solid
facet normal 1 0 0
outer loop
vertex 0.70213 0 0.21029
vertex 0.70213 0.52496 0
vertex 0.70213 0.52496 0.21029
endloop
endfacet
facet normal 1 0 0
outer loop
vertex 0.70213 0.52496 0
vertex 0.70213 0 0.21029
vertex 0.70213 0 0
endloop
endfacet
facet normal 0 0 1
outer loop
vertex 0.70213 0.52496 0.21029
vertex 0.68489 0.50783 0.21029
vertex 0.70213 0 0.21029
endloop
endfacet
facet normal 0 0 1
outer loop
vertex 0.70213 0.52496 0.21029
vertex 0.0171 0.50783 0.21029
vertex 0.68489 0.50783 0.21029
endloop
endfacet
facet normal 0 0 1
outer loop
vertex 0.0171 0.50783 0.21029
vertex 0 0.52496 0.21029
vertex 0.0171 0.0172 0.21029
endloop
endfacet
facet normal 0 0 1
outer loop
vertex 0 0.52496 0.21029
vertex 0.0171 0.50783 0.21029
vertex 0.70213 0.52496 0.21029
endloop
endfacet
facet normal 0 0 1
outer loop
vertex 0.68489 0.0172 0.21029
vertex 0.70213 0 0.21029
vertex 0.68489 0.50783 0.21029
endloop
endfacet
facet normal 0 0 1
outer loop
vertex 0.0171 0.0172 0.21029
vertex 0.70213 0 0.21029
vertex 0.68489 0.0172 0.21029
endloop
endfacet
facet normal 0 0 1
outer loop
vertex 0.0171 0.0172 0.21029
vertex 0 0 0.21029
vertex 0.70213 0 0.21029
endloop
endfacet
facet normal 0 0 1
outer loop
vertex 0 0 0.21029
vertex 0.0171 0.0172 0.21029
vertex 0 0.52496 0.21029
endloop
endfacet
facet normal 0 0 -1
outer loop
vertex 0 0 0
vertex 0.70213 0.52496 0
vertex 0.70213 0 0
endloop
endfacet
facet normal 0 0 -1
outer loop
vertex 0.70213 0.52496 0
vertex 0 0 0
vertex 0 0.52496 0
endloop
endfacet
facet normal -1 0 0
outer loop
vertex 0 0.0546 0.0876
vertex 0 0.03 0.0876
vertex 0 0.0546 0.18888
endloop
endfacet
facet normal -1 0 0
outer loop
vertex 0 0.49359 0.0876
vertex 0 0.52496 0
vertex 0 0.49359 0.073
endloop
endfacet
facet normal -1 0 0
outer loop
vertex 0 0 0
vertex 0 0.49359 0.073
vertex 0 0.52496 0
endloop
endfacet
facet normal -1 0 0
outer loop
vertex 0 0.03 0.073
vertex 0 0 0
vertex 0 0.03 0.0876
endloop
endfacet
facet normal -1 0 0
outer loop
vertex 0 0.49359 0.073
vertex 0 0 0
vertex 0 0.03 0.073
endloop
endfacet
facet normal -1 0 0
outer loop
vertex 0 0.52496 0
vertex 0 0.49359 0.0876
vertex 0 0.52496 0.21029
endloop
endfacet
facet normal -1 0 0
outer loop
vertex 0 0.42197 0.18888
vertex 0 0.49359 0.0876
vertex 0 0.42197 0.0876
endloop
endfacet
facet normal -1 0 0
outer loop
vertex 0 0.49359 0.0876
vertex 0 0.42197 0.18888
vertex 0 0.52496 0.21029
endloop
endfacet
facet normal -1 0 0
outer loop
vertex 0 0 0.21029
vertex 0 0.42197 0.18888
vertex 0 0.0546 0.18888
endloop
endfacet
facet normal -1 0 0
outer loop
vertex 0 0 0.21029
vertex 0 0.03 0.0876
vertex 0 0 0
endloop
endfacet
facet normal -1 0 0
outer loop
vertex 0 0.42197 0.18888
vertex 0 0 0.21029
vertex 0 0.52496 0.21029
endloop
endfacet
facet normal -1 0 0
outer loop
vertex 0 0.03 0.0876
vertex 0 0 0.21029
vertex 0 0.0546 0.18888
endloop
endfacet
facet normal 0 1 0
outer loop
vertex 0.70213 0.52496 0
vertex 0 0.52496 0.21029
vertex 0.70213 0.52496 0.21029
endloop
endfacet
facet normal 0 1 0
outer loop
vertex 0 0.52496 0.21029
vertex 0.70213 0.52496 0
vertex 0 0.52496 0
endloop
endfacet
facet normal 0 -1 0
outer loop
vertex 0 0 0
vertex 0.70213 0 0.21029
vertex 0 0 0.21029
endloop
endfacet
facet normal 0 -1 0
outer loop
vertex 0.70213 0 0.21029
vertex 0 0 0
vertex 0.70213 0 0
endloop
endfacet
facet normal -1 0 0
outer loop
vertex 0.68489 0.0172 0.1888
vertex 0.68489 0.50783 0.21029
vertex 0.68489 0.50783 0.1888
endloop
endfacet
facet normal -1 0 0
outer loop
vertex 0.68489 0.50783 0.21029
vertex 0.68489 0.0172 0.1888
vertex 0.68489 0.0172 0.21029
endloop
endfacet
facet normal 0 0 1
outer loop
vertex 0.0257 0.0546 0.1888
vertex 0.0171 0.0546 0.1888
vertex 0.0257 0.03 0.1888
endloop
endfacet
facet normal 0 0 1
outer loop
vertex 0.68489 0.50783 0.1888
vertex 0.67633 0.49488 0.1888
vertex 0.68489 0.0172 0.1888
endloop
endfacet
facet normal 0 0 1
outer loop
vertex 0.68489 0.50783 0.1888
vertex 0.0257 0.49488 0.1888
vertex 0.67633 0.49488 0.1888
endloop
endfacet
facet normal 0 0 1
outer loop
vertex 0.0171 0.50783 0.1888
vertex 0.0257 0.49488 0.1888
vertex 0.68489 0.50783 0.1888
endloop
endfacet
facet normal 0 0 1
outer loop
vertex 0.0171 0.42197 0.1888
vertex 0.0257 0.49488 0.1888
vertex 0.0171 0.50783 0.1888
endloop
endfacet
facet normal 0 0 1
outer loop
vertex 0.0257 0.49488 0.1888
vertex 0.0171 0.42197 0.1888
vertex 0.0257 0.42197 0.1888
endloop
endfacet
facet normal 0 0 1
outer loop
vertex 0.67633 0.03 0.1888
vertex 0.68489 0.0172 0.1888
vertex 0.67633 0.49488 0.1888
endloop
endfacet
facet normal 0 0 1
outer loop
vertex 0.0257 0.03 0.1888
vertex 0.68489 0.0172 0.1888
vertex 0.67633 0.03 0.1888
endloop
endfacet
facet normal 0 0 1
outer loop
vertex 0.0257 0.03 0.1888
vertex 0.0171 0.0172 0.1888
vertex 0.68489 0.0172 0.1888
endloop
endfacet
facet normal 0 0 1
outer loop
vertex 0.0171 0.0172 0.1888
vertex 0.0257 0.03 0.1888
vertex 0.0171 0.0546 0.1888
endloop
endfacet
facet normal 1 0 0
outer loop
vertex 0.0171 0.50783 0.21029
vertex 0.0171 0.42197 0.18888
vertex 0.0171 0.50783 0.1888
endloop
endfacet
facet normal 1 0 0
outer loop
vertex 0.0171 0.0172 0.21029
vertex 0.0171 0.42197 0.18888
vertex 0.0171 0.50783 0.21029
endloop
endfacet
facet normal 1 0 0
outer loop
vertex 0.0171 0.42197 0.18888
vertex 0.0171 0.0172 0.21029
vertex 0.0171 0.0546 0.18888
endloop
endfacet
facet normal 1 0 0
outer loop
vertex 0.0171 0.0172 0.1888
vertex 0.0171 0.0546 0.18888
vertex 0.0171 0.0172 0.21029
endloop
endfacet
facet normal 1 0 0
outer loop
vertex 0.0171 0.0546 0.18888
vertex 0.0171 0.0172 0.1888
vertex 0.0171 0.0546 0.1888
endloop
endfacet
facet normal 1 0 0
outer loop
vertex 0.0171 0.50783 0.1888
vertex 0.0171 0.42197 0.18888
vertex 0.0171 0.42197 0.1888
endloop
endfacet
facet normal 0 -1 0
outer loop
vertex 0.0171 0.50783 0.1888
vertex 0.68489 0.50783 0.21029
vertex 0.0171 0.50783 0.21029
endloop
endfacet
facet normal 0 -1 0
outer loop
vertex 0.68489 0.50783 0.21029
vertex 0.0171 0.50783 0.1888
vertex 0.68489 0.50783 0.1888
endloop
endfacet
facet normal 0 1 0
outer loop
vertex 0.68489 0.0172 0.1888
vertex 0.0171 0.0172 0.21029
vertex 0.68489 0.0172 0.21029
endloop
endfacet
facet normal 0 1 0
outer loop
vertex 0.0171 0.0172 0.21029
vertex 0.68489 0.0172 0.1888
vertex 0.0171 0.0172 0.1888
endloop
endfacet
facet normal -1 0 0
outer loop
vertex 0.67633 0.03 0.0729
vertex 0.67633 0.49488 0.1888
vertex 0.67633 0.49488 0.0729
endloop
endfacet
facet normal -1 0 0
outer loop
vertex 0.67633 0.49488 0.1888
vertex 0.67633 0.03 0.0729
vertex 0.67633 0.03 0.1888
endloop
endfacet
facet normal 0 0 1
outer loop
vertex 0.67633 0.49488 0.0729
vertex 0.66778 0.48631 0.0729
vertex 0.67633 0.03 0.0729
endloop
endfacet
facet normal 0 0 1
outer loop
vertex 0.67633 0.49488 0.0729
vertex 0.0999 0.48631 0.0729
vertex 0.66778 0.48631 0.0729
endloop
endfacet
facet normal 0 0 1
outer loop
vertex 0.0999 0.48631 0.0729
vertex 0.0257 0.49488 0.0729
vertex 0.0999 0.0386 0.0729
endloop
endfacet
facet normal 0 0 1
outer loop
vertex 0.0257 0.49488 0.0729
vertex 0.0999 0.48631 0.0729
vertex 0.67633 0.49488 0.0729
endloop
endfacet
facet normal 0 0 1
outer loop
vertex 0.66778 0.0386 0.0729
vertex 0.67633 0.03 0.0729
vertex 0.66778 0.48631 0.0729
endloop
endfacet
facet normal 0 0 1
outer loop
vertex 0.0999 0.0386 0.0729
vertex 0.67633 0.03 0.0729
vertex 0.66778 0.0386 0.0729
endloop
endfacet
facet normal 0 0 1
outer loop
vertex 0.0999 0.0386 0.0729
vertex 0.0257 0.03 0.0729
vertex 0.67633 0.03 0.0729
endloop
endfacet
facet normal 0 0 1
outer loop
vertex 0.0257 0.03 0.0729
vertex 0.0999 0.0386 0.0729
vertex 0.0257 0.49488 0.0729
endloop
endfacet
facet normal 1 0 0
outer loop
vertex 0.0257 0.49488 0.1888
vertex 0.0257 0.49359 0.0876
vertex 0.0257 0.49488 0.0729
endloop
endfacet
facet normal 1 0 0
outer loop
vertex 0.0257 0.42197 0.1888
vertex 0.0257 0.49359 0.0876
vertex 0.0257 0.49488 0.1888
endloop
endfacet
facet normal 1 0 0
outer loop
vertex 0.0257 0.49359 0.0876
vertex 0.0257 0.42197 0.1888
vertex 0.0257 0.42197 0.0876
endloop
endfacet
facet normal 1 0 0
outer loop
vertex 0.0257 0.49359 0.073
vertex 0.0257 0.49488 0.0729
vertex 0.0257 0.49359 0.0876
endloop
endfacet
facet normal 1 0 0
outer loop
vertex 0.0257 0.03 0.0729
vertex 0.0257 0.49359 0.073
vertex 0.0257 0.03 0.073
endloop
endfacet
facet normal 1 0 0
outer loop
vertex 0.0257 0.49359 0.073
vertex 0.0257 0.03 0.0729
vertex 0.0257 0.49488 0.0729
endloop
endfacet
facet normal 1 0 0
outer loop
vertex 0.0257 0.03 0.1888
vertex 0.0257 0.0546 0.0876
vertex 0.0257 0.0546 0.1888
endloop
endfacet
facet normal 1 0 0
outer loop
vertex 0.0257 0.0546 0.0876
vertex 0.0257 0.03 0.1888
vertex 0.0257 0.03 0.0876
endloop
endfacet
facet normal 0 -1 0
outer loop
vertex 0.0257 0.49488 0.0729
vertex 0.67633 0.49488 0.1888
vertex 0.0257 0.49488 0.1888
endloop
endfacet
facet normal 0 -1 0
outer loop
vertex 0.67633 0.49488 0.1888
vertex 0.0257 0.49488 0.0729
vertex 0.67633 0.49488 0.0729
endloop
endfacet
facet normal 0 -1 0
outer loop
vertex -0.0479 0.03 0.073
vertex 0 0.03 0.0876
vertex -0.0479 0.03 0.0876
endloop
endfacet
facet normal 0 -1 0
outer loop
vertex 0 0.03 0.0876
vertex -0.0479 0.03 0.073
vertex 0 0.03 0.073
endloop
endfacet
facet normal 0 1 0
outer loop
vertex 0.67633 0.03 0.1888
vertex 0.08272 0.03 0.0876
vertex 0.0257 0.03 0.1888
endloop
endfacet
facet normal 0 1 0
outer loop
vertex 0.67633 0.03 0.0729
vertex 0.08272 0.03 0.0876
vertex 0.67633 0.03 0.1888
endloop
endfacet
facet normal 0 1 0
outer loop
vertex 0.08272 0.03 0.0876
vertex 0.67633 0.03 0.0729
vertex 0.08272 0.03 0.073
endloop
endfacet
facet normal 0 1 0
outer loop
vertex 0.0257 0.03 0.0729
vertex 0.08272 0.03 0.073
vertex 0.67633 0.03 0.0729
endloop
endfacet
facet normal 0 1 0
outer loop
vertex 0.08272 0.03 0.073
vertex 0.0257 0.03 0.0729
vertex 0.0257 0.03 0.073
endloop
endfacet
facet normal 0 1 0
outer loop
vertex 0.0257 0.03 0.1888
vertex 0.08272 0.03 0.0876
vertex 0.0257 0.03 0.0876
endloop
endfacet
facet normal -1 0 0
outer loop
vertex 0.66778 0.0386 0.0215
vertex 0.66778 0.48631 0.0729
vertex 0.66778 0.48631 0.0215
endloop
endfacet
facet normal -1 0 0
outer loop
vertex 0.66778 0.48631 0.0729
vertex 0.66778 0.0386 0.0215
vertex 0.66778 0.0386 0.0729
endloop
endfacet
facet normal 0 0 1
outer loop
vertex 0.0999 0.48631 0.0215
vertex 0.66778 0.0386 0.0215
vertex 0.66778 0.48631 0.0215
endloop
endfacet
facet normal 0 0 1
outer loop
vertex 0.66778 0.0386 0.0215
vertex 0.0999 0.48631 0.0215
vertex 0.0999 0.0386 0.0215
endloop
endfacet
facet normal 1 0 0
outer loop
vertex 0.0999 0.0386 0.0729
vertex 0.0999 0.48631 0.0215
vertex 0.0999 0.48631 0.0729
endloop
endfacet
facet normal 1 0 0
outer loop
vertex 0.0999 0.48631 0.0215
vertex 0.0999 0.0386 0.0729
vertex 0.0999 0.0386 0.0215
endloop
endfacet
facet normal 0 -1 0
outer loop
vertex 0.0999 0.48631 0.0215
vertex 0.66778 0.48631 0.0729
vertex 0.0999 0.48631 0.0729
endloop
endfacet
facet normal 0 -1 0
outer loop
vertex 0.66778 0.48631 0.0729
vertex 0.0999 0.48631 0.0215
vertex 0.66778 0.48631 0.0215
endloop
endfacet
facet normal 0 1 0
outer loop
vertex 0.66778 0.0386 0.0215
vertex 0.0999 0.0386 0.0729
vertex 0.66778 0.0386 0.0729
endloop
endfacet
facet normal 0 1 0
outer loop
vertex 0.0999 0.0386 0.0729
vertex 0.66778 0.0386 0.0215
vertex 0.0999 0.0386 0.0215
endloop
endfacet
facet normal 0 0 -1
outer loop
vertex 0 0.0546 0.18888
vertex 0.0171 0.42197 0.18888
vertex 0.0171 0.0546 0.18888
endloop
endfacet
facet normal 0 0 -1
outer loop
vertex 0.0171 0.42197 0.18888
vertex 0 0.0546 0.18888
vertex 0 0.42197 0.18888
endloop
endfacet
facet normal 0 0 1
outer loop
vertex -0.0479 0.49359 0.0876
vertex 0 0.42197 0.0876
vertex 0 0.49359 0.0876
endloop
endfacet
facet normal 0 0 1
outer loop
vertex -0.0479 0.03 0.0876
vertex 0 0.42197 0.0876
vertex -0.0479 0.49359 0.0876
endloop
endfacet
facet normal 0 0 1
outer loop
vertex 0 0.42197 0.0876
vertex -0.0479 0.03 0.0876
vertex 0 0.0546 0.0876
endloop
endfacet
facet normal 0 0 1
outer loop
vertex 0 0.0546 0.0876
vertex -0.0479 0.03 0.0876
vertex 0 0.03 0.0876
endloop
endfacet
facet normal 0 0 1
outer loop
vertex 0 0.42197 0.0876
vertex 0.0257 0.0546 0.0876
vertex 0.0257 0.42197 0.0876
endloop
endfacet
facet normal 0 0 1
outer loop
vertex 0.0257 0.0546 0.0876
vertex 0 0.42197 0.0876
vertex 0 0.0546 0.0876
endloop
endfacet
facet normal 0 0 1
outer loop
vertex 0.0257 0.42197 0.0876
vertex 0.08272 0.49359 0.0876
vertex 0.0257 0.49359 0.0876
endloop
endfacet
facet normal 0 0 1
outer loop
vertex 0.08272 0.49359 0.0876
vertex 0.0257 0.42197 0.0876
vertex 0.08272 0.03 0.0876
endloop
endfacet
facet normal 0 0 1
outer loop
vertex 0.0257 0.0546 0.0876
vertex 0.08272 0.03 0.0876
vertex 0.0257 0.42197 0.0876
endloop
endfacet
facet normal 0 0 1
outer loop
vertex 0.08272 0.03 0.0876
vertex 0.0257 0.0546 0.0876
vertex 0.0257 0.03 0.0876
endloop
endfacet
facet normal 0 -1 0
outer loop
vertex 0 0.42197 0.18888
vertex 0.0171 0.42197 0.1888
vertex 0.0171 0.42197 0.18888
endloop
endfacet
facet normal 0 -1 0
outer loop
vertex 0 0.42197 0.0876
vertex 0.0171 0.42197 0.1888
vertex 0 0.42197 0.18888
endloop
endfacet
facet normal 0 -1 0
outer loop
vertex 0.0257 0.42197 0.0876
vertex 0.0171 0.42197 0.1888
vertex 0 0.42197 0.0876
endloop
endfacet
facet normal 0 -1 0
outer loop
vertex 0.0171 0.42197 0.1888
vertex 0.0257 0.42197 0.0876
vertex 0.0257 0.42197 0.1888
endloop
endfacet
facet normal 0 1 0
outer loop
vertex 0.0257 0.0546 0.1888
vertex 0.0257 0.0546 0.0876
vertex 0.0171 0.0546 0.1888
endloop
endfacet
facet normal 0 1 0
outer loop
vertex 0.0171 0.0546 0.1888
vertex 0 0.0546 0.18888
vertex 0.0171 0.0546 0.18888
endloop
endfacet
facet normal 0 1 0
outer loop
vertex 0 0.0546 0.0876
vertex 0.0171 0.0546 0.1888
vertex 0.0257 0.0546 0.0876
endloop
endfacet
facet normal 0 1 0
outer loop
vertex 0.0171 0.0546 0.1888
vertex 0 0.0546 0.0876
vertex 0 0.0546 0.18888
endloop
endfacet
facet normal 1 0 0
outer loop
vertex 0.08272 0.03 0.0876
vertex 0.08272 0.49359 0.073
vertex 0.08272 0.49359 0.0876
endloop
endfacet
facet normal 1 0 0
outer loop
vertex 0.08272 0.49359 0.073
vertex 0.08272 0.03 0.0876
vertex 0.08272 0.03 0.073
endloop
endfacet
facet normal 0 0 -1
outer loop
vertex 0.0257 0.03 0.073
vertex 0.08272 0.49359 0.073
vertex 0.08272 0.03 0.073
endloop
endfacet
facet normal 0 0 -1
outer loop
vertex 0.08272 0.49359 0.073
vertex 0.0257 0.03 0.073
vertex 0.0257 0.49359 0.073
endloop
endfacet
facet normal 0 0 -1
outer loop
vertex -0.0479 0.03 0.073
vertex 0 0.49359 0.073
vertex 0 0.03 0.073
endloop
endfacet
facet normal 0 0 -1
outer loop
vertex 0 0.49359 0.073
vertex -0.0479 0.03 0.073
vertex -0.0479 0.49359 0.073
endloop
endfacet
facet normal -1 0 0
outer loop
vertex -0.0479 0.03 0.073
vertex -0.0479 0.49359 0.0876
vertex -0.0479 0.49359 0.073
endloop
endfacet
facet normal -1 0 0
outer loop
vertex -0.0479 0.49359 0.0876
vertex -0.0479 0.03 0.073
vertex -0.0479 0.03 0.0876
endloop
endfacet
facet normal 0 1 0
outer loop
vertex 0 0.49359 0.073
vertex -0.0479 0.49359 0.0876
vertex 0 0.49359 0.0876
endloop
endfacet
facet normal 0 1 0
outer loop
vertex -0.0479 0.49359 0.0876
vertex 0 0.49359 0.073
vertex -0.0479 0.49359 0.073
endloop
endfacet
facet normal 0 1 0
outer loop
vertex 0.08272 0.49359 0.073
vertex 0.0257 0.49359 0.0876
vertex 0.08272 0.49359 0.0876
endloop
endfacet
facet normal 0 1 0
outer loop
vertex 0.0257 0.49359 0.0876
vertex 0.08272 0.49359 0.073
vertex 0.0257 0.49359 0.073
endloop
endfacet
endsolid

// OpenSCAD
// === Parameters ===

// Main body dimensions
body_length = 0.702127;   // x-axis
body_width  = 0.524964;   // y-axis
body_height = 0.210295;   // z-axis

// Top shallow recess (step 1 pocket from top)
r1_length      = 0.667793;
r1_width       = 0.490631;
r1_inset_left  = 0.0171;
r1_inset_front = 0.0172;
r1_z_bottom    = 0.1888;
r1_depth       = 0.0215;

// Middle contained cut (step 2 pocket)
r2_length      = 0.650626;
r2_width       = 0.46488;
r2_inset_left  = 0.0257;
r2_inset_front = 0.03;
r2_z_bottom    = 0.0729;
r2_depth       = 0.1159;

// Lower offset pocket (step 3, non-through)
r3_length      = 0.567882;
r3_width       = 0.447713;
r3_inset_left  = 0.0999;
r3_inset_front = 0.0386;
r3_z_bottom    = 0.0215;
r3_depth       = 0.0515;

// Side projection (solid addition on left edge)
proj_length     = 0.130618;
proj_width      = 0.463588;
proj_overhang   = 0.0479;   // extends past left edge
proj_inset_front = 0.03;
proj_z_bottom   = 0.073;
proj_thickness  = 0.0146;

// Side recess (cut into left face)
sr_cut_depth    = 0.0343;
sr_length       = 0.367372;
sr_inset_front  = 0.0546;
sr_z_bottom     = 0.0876;
sr_height       = 0.101285;

// Small epsilon for clean boolean cuts
eps = 0.001;

// === Assembly ===
union() {
    difference() {
        // Step 1: Main rectangular body
        cube([body_length, body_width, body_height]);

        // Step 2: Top shallow recess (inset from all four edges)
        translate([r1_inset_left, r1_inset_front, r1_z_bottom])
            cube([r1_length, r1_width, r1_depth + eps]);

        // Step 3: Middle contained rectangular cut (deeper, narrower)
        translate([r2_inset_left, r2_inset_front, r2_z_bottom])
            cube([r2_length, r2_width, r2_depth + eps]);

        // Step 4: Lower offset pocket (non-through, leaves 0.0215 bottom)
        translate([r3_inset_left, r3_inset_front, r3_z_bottom])
            cube([r3_length, r3_width, r3_depth + eps]);

        // Step 6: Side recess cut at the left edge
        translate([-eps, sr_inset_front, sr_z_bottom])
            cube([sr_cut_depth + eps, sr_length, sr_height]);
    }

    // Step 5: Solid rectangular side projection overhanging left edge
    translate([-proj_overhang, proj_inset_front, proj_z_bottom])
        cube([proj_length, proj_width, proj_thickness]);
}
